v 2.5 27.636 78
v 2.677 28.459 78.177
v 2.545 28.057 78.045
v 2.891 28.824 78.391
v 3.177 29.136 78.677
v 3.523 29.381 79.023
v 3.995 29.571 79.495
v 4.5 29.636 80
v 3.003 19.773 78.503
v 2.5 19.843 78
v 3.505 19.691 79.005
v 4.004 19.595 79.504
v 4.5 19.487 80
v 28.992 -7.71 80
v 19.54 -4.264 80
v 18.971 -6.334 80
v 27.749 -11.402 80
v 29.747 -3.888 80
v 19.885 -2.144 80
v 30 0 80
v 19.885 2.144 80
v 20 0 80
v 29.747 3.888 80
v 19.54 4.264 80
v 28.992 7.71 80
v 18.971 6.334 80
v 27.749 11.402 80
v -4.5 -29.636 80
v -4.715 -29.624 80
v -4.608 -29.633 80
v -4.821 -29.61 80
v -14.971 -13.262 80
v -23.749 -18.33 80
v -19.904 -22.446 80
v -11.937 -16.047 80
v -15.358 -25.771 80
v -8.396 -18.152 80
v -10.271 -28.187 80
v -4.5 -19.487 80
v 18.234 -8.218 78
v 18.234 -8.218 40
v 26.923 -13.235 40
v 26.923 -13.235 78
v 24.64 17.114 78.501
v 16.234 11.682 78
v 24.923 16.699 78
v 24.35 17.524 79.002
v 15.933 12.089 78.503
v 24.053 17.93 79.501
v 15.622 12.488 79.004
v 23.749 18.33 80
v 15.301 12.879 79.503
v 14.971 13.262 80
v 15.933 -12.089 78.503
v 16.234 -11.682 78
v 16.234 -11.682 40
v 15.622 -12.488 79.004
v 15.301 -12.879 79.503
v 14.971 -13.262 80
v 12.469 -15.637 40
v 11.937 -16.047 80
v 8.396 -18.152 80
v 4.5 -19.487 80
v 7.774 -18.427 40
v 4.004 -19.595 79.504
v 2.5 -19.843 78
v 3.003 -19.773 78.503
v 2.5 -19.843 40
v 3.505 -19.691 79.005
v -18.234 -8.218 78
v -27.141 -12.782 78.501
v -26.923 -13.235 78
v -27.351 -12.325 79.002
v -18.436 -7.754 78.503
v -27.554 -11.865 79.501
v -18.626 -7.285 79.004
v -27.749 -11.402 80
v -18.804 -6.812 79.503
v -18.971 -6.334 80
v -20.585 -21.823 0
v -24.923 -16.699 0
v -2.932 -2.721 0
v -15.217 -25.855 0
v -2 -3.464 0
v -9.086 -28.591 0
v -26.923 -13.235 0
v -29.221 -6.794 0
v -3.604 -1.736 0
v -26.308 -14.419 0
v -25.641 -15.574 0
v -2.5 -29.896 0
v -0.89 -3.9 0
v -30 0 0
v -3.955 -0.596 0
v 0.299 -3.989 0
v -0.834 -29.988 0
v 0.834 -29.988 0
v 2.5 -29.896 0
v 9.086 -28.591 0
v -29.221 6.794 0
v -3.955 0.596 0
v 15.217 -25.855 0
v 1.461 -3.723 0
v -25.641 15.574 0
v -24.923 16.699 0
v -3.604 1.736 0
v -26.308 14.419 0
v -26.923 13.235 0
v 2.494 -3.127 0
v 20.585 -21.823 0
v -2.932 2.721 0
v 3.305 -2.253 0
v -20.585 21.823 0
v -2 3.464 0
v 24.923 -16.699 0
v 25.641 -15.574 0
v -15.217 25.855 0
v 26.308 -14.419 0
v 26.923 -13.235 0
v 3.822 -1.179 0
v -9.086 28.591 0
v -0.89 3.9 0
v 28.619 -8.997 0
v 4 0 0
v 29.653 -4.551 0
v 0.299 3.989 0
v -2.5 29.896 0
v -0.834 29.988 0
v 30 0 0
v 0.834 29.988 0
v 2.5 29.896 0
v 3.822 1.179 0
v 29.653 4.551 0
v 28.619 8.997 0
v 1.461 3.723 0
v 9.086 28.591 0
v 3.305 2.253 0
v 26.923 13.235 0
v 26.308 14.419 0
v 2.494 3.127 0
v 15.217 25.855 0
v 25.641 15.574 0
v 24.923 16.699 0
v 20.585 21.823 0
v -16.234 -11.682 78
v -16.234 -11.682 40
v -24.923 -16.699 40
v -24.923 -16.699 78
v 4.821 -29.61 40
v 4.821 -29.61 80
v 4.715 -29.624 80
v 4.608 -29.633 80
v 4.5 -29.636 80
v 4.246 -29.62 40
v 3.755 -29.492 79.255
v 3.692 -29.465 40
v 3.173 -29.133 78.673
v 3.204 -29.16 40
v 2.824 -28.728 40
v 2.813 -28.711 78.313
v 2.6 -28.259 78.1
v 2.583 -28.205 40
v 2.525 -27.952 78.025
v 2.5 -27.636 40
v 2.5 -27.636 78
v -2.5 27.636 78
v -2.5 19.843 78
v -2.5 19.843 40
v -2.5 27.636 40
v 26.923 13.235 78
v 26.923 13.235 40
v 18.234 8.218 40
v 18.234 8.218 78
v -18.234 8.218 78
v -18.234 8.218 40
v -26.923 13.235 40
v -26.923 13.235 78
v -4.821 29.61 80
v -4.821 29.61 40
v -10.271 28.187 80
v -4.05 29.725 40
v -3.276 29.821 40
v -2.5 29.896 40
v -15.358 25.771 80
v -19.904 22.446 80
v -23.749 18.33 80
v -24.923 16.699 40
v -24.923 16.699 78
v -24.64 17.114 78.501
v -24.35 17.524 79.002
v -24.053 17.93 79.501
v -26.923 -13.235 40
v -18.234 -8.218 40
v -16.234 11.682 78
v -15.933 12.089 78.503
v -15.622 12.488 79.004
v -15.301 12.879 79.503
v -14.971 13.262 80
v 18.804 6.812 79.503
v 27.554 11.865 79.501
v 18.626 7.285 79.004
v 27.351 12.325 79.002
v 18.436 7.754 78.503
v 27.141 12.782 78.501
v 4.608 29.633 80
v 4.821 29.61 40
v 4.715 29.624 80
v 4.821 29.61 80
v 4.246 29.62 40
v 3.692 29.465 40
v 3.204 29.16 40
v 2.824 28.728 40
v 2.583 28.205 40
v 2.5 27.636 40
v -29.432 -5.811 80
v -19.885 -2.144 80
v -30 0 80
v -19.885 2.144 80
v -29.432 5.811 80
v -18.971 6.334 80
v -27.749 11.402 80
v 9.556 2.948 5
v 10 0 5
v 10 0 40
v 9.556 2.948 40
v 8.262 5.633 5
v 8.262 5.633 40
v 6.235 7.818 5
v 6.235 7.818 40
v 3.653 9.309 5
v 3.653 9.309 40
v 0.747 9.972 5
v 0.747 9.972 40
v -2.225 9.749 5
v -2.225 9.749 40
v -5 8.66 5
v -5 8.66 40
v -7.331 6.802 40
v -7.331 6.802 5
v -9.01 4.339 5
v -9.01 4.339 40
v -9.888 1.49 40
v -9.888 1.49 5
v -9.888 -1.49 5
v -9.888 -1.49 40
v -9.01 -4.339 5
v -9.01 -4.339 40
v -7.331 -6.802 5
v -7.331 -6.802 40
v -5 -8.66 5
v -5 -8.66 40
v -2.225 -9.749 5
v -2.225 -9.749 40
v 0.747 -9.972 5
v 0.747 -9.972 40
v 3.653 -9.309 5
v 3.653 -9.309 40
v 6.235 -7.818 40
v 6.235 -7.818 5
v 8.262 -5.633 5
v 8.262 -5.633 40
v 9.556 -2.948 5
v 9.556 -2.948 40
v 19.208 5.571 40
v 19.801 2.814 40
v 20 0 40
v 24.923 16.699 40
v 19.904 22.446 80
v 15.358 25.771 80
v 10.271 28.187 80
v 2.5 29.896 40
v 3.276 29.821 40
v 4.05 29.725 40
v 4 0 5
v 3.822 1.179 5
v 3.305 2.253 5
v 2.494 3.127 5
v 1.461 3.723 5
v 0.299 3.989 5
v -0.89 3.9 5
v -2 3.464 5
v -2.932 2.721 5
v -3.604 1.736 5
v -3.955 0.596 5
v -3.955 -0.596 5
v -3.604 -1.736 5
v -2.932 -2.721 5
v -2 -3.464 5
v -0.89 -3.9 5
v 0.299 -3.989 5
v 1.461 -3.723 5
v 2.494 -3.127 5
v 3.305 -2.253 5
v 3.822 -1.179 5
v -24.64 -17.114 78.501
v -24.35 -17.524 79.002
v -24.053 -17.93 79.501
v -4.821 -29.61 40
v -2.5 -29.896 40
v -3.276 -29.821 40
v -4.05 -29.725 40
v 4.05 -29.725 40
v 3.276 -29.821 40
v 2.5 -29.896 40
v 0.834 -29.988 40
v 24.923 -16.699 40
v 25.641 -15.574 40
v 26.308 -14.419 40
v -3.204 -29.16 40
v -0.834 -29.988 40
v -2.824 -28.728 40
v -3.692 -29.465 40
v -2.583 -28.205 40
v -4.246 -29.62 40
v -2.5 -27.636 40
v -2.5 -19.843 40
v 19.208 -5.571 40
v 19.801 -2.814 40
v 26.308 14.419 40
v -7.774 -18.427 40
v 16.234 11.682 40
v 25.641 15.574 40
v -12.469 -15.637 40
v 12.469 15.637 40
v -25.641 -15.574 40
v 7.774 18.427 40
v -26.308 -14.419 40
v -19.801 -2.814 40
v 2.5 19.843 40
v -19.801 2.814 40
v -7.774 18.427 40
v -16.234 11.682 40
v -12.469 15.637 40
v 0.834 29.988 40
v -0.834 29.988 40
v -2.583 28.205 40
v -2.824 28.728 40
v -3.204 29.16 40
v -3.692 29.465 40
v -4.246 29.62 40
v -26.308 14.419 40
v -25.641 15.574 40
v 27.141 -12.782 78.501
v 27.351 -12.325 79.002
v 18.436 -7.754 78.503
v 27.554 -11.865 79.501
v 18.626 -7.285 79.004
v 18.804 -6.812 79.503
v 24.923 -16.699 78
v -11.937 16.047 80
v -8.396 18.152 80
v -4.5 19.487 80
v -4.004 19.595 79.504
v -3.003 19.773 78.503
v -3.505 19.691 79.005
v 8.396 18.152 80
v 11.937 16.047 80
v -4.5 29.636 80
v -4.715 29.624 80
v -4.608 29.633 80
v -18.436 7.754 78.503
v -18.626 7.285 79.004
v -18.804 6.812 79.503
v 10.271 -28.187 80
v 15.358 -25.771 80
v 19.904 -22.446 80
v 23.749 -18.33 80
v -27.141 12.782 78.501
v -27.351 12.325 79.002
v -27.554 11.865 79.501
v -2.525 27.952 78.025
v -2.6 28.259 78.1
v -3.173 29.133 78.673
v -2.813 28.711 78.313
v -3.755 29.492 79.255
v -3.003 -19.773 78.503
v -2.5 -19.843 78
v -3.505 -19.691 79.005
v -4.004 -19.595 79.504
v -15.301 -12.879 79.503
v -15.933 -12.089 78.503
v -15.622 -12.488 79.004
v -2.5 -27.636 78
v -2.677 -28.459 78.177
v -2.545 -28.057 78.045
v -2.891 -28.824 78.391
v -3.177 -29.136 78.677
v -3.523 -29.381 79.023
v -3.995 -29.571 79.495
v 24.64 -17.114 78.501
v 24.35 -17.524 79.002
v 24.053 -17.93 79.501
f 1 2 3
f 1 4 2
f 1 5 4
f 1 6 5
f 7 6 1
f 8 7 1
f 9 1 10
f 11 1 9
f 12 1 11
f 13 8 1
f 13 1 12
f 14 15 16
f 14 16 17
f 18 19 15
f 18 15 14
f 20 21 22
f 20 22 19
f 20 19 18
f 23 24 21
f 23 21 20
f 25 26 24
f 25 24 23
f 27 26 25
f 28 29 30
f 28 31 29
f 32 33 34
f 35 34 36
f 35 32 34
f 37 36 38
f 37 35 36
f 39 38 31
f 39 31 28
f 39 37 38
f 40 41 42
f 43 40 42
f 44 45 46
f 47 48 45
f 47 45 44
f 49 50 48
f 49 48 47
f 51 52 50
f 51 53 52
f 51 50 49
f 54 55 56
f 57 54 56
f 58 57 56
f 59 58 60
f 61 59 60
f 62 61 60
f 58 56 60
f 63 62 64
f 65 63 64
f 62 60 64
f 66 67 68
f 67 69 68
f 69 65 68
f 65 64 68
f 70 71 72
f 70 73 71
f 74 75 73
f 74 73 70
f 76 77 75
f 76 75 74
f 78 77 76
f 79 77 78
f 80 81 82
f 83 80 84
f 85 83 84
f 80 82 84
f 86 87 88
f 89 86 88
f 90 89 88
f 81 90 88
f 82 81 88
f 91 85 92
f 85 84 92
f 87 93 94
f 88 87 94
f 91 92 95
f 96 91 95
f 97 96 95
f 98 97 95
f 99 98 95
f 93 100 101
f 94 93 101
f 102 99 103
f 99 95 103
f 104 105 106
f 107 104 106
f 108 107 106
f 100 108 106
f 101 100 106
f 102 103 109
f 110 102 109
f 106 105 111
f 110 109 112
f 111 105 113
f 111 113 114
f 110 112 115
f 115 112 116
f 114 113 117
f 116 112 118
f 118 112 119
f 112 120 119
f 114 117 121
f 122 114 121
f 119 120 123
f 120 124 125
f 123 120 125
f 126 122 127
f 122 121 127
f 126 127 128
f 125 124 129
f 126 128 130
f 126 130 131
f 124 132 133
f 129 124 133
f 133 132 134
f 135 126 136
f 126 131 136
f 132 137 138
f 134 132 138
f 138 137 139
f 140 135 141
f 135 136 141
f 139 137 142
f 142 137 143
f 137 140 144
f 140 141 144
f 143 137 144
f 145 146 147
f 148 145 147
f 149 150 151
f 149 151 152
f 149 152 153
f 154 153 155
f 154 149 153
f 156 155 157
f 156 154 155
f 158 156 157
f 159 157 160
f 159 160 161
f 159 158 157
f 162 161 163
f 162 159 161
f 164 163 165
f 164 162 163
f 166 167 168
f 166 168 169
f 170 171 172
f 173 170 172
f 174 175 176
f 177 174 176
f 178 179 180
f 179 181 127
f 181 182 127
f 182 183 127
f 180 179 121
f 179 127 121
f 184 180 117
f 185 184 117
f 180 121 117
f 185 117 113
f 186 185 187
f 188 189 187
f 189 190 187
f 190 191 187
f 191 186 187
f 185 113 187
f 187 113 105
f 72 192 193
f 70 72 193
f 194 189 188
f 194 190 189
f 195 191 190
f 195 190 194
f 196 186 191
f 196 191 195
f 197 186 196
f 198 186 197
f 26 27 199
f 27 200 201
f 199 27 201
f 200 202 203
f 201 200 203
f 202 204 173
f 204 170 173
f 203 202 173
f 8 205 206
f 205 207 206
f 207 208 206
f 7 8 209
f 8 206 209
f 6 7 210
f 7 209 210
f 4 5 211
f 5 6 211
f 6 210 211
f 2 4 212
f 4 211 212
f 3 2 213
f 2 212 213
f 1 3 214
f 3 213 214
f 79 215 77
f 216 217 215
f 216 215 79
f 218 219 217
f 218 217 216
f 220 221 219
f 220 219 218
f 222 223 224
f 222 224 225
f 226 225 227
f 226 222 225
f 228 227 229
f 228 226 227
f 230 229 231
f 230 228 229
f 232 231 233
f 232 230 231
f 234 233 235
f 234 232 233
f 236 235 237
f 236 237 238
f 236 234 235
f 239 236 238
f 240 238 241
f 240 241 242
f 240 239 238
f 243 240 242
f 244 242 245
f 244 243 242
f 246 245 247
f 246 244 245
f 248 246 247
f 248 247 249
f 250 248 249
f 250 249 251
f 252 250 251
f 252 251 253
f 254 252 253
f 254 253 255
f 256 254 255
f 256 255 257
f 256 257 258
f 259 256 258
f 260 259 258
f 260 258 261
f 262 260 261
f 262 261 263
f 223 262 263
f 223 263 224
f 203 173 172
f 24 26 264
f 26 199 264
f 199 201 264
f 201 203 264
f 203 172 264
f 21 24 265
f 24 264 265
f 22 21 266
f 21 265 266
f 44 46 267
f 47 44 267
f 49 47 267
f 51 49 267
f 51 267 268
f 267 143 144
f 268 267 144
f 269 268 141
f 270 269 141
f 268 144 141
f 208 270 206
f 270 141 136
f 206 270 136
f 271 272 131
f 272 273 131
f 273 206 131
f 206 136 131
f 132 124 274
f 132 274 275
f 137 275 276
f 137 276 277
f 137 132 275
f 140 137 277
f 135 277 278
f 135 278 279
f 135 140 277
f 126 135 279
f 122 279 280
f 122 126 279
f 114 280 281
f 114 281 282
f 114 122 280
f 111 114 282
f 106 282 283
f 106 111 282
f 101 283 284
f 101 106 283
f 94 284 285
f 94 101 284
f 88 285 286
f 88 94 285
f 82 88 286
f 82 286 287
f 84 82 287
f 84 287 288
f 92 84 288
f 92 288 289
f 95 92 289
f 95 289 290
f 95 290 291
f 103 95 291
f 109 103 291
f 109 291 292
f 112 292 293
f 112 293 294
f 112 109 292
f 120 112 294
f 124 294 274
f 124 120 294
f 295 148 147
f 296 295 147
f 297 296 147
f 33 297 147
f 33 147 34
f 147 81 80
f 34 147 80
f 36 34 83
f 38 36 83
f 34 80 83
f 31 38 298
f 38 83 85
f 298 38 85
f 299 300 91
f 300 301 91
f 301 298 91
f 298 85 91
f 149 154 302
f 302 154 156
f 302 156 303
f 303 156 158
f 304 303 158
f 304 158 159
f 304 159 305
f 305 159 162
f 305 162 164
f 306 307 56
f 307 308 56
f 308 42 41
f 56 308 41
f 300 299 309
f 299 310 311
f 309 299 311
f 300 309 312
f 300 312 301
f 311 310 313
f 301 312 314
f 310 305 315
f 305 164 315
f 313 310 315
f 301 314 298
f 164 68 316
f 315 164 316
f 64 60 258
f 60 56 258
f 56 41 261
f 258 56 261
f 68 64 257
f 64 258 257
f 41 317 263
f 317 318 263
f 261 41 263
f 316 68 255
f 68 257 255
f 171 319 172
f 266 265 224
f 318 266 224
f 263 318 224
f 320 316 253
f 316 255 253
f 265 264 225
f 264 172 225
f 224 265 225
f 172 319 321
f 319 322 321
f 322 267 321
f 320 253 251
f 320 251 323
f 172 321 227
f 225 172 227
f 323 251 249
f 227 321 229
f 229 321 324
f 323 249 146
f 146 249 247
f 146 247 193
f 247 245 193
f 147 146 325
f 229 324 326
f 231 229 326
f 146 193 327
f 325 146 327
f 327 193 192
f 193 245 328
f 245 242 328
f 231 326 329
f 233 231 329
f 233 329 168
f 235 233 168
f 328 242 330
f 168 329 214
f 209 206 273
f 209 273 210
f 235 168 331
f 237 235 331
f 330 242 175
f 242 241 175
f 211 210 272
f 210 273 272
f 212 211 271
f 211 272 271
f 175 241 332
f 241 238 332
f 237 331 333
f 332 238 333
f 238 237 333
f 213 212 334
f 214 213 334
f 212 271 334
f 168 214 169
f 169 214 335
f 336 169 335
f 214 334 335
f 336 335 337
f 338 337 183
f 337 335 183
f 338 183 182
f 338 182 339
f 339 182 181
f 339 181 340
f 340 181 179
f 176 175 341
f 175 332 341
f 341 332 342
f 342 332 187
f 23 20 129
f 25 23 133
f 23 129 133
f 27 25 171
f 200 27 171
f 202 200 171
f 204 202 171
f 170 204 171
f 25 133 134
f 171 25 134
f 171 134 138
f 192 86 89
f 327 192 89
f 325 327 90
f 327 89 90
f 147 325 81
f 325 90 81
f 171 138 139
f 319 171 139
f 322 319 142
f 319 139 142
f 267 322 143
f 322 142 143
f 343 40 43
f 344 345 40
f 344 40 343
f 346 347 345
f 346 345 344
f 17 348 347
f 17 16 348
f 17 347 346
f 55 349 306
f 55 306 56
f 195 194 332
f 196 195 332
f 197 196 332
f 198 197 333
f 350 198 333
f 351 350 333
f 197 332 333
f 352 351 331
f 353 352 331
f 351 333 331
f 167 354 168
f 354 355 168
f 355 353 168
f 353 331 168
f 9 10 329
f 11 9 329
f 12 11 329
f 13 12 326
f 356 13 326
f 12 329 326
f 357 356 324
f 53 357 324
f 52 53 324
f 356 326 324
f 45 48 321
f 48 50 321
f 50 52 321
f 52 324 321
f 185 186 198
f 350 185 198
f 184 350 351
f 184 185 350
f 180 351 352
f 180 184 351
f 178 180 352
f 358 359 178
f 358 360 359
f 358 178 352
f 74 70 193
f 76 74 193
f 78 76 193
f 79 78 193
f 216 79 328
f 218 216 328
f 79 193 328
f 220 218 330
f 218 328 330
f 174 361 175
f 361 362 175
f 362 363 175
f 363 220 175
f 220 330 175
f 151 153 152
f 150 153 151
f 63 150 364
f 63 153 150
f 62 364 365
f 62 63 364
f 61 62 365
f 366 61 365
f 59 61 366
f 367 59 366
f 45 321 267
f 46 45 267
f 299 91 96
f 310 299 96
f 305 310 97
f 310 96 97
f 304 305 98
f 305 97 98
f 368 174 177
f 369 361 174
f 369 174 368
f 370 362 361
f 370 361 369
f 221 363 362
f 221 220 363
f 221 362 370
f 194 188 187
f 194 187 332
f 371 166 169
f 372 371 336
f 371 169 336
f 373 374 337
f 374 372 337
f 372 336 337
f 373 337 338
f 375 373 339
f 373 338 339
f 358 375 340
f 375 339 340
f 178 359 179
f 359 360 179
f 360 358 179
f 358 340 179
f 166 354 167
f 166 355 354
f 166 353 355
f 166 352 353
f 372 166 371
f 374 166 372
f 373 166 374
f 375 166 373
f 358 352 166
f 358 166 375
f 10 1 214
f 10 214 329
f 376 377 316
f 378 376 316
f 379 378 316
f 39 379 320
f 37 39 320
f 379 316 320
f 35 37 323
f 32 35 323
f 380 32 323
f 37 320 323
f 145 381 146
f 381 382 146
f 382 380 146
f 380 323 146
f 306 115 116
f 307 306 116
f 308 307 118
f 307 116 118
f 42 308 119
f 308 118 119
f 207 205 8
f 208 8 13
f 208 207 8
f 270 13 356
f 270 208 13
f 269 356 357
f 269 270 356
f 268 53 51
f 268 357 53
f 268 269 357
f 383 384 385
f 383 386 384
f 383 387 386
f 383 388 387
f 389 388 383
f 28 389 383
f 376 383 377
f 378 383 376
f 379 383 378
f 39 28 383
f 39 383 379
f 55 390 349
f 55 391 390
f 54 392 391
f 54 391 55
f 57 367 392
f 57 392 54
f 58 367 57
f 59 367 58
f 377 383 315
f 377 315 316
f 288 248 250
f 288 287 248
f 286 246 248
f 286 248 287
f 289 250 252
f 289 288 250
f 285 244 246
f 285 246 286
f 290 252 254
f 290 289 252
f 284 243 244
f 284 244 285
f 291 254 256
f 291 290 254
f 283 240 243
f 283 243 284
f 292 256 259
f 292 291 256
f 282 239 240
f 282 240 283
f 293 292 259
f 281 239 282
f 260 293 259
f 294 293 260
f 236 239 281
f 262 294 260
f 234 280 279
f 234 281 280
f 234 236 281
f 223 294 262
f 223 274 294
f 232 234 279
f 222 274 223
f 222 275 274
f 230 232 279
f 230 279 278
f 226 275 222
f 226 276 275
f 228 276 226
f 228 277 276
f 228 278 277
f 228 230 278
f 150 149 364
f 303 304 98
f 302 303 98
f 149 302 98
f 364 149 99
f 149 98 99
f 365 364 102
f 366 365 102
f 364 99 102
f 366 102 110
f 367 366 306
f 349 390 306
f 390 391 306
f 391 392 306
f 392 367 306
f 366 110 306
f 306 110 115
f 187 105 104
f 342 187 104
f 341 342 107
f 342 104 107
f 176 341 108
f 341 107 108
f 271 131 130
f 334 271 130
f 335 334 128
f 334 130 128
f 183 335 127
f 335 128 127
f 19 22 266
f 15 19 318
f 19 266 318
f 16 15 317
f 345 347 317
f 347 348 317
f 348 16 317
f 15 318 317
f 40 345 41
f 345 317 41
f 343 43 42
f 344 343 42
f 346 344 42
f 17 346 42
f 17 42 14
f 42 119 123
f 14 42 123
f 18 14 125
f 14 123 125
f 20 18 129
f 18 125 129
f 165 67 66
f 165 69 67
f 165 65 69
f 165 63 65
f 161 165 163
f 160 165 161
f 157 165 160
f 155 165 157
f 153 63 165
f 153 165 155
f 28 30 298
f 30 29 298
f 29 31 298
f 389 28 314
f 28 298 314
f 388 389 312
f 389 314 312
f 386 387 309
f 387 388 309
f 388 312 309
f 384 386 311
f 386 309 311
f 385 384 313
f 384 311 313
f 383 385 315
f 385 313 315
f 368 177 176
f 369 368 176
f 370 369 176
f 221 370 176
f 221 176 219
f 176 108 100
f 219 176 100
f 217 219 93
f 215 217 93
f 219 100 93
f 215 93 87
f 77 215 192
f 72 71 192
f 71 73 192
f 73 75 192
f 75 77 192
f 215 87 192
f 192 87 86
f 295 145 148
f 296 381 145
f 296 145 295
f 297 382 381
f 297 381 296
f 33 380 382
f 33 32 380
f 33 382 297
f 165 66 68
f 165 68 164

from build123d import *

# Parameters (mm, degrees)
F1_DEPTH    = 80
F0_R        = 10
F2_DEPTH    = 40
F0_R_2      = 4
F3_DEPTH    = 5
F4_SIZE     = 2
F5_T1_DEPTH = 43.847334297


# Not quite as in the source:
# - a fillet or chamfer that OpenCascade refuses, or shapes differently, is made with other operations: its cross-section is extruded or revolved along the edge and cut away or added


with BuildPart() as f1:
    # F0 (on Top) → F1 (new body)
    with BuildSketch(Plane.XY):
        with BuildLine():
            ThreePointArc((26.9229627936, -13.2345787395), (29.220616727, -6.7937881992), (30, 0))
            ThreePointArc((30, 0), (29.220616727, 6.7937881992), (26.9229627936, 13.2345787395))
            Line((26.9229627936, 13.2345787395), (18.2336879396, 8.2178235635))
            ThreePointArc((18.2336879396, 8.2178235635), (19.5534365112, 4.2027515515), (20, 0))
            ThreePointArc((20, 0), (19.5534365112, -4.2027515515), (18.2336879396, -8.2178235635))
            Line((18.2336879396, -8.2178235635), (26.9229627936, -13.2345787395))
        make_face()
    extrude(amount=F1_DEPTH)



with BuildPart() as f1b:
    # F0 (on Top) → F1, piece 2 (new body)
    with BuildSketch(Plane.XY):
        with BuildLine():
            Line((16.2336879396, 11.6819251786), (24.9229627936, 16.6986803547))
            ThreePointArc((24.9229627936, 16.6986803547), (15.21659411, 25.8545018071), (2.5, 29.8956518578))
            Line((2.5, 29.8956518578), (2.5, 19.843134833))
            ThreePointArc((2.5, 19.843134833), (10.2170984976, 17.1933387767), (16.2336879396, 11.6819251786))
        make_face()
    extrude(amount=F1_DEPTH)


with BuildPart() as f1c:
    # F0 (on Top) → F1, piece 3 (new body)
    with BuildSketch(Plane.XY):
        with BuildLine():
            ThreePointArc((2.5, -29.8956518578), (15.21659411, -25.8545018071), (24.9229627936, -16.6986803547))
            Line((24.9229627936, -16.6986803547), (16.2336879396, -11.6819251786))
            ThreePointArc((16.2336879396, -11.6819251786), (10.2170984976, -17.1933387767), (2.5, -19.843134833))
            Line((2.5, -19.843134833), (2.5, -29.8956518578))
        make_face()
    extrude(amount=F1_DEPTH)


with BuildPart() as f1d:
    # F0 (on Top) → F1, piece 4 (new body)
    with BuildSketch(Plane.XY):
        with BuildLine():
            Line((-2.5, 19.843134833), (-2.5, 29.8956518578))
            ThreePointArc((-2.5, 29.8956518578), (-15.21659411, 25.8545018071), (-24.9229627936, 16.6986803547))
            Line((-24.9229627936, 16.6986803547), (-16.2336879396, 11.6819251786))
            ThreePointArc((-16.2336879396, 11.6819251786), (-10.2170984976, 17.1933387767), (-2.5, 19.843134833))
        make_face()
    extrude(amount=F1_DEPTH)


with BuildPart() as f1e:
    # F0 (on Top) → F1, piece 5 (new body)
    with BuildSketch(Plane.XY):
        with BuildLine():
            ThreePointArc((-24.9229627936, -16.6986803547), (-15.21659411, -25.8545018071), (-2.5, -29.8956518578))
            Line((-2.5, -29.8956518578), (-2.5, -19.843134833))
            ThreePointArc((-2.5, -19.843134833), (-10.2170984976, -17.1933387767), (-16.2336879396, -11.6819251786))
            Line((-16.2336879396, -11.6819251786), (-24.9229627936, -16.6986803547))
        make_face()
    extrude(amount=F1_DEPTH)


with BuildPart() as f1f:
    # F0 (on Top) → F1, piece 6 (new body)
    with BuildSketch(Plane.XY):
        with BuildLine():
            Line((-18.2336879396, 8.2178235635), (-26.9229627936, 13.2345787395))
            ThreePointArc((-26.9229627936, 13.2345787395), (-30, 0), (-26.9229627936, -13.2345787395))
            Line((-26.9229627936, -13.2345787395), (-18.2336879396, -8.2178235635))
            ThreePointArc((-18.2336879396, -8.2178235635), (-20, 0), (-18.2336879396, 8.2178235635))
        make_face()
    extrude(amount=F1_DEPTH)


with BuildPart() as f1_1:
    add(f1.part)

    add(f1b.part)  # F2 merges F1b

    add(f1c.part)  # F2 merges F1c

    add(f1d.part)  # F2 merges F1d

    add(f1e.part)  # F2 merges F1e

    add(f1f.part)  # F2 merges F1f
    # F0 (on Top) → F2 (join)
    with BuildSketch(Plane.XY):
        with BuildLine():
            Line((18.2336879396, 8.2178235635), (26.9229627936, 13.2345787395))
            ThreePointArc((26.9229627936, 13.2345787395), (25.9807621135, 15), (24.9229627936, 16.6986803547))
            Line((24.9229627936, 16.6986803547), (16.2336879396, 11.6819251786))
            ThreePointArc((16.2336879396, 11.6819251786), (17.3205080757, 10), (18.2336879396, 8.2178235635))
        make_face()
        with BuildLine():
            ThreePointArc((24.9229627936, -16.6986803547), (25.9807621135, -15), (26.9229627936, -13.2345787395))
            Line((26.9229627936, -13.2345787395), (18.2336879396, -8.2178235635))
            ThreePointArc((18.2336879396, -8.2178235635), (17.3205080757, -10), (16.2336879396, -11.6819251786))
            Line((16.2336879396, -11.6819251786), (24.9229627936, -16.6986803547))
        make_face()
        with BuildLine():
            ThreePointArc((20, 0), (19.5534365112, 4.2027515515), (18.2336879396, 8.2178235635))
            ThreePointArc((18.2336879396, 8.2178235635), (17.3205080757, 10), (16.2336879396, 11.6819251786))
            ThreePointArc((16.2336879396, 11.6819251786), (10.2170984976, 17.1933387767), (2.5, 19.843134833))
            ThreePointArc((2.5, 19.843134833), (0, 20), (-2.5, 19.843134833))
            ThreePointArc((-2.5, 19.843134833), (-10.2170984976, 17.1933387767), (-16.2336879396, 11.6819251786))
            ThreePointArc((-16.2336879396, 11.6819251786), (-17.3205080757, 10), (-18.2336879396, 8.2178235635))
            ThreePointArc((-18.2336879396, 8.2178235635), (-20, 0), (-18.2336879396, -8.2178235635))
            ThreePointArc((-18.2336879396, -8.2178235635), (-17.3205080757, -10), (-16.2336879396, -11.6819251786))
            ThreePointArc((-16.2336879396, -11.6819251786), (-10.2170984976, -17.1933387767), (-2.5, -19.843134833))
            ThreePointArc((-2.5, -19.843134833), (0, -20), (2.5, -19.843134833))
            ThreePointArc((2.5, -19.843134833), (10.2170984976, -17.1933387767), (16.2336879396, -11.6819251786))
            ThreePointArc((16.2336879396, -11.6819251786), (17.3205080757, -10), (18.2336879396, -8.2178235635))
            ThreePointArc((18.2336879396, -8.2178235635), (19.5534365112, -4.2027515515), (20, 0))
        make_face()
        Circle(F0_R, mode=Mode.SUBTRACT)
        with BuildLine():
            Line((2.5, 19.843134833), (2.5, 29.8956518578))
            ThreePointArc((2.5, 29.8956518578), (0, 30), (-2.5, 29.8956518578))
            Line((-2.5, 29.8956518578), (-2.5, 19.843134833))
            ThreePointArc((-2.5, 19.843134833), (0, 20), (2.5, 19.843134833))
        make_face()
        with BuildLine():
            ThreePointArc((-2.5, -29.8956518578), (0, -30), (2.5, -29.8956518578))
            Line((2.5, -29.8956518578), (2.5, -19.843134833))
            ThreePointArc((2.5, -19.843134833), (0, -20), (-2.5, -19.843134833))
            Line((-2.5, -19.843134833), (-2.5, -29.8956518578))
        make_face()
        with BuildLine():
            Line((-16.2336879396, 11.6819251786), (-24.9229627936, 16.6986803547))
            ThreePointArc((-24.9229627936, 16.6986803547), (-25.9807621135, 15), (-26.9229627936, 13.2345787395))
            Line((-26.9229627936, 13.2345787395), (-18.2336879396, 8.2178235635))
            ThreePointArc((-18.2336879396, 8.2178235635), (-17.3205080757, 10), (-16.2336879396, 11.6819251786))
        make_face()
        with BuildLine():
            ThreePointArc((-26.9229627936, -13.2345787395), (-25.9807621135, -15), (-24.9229627936, -16.6986803547))
            Line((-24.9229627936, -16.6986803547), (-16.2336879396, -11.6819251786))
            ThreePointArc((-16.2336879396, -11.6819251786), (-17.3205080757, -10), (-18.2336879396, -8.2178235635))
            Line((-18.2336879396, -8.2178235635), (-26.9229627936, -13.2345787395))
        make_face()
    extrude(amount=F2_DEPTH)

    # F0 (on Top) → F3 (join)
    with BuildSketch(Plane.XY):
        Circle(F0_R)
        Circle(F0_R_2, mode=Mode.SUBTRACT)
    extrude(amount=F3_DEPTH)

    # F4
    f4_edges = [f1_1.edges().sort_by_distance(p)[0] for p in [
        (-20.578325, 14.190303, 80),
        (-22.578325, 10.726201, 80),
        (-22.578325, -10.726201, 80),
        (-20.578325, -14.190303, 80),
        (20.578325, -14.190303, 80),
        (22.578325, -10.726201, 80),
        (22.578325, 10.726201, 80),
        (20.578325, 14.190303, 80),
        (-2.5, 24.869393, 80),
        (2.5, 24.869393, 80),
        (2.5, -24.869393, 80),
        (-2.5, -24.869393, 80),
    ]]
    chamfer(f4_edges, length=F4_SIZE)

    # F5: fillet of radius 2 on 6 edges, made by hand

    # F5_s2 → F5_t1 (cut)
    with BuildSketch(Plane.XY.offset(40)):
        with BuildLine():
            ThreePointArc((-2.5, 27.6360272109), (-3.2044030609, 29.1596507114), (-4.8214285714, 29.6100291545))
            ThreePointArc((-4.8214285714, 29.6100291545), (-3.6634988964, 29.7754727223), (-2.5, 29.8956518578))
            Line((-2.5, 29.8956518578), (-2.5, 27.6360272109))
        make_face()
        with BuildLine():
            ThreePointArc((4.8214285714, 29.6100291545), (3.2044030609, 29.1596507114), (2.5, 27.6360272109))
            Line((2.5, 27.6360272109), (2.5, 29.8956518578))
            ThreePointArc((2.5, 29.8956518578), (3.6634988964, 29.7754727223), (4.8214285714, 29.6100291545))
        make_face()
        with BuildLine():
            ThreePointArc((-4.8214285714, -29.6100291545), (-3.2044030609, -29.1596507114), (-2.5, -27.6360272109))
            Line((-2.5, -27.6360272109), (-2.5, -29.8956518578))
            ThreePointArc((-2.5, -29.8956518578), (-3.6634988964, -29.7754727223), (-4.8214285714, -29.6100291545))
        make_face()
        with BuildLine():
            ThreePointArc((4.8214285714, -29.6100291545), (3.2044030609, -29.1596507114), (2.5, -27.6360272109))
            Line((2.5, -27.6360272109), (2.5, -29.8956518578))
            ThreePointArc((2.5, -29.8956518578), (3.6634988964, -29.7754727223), (4.8214285714, -29.6100291545))
        make_face()
    extrude(amount=F5_T1_DEPTH, mode=Mode.SUBTRACT)


solid = f1_1.part
